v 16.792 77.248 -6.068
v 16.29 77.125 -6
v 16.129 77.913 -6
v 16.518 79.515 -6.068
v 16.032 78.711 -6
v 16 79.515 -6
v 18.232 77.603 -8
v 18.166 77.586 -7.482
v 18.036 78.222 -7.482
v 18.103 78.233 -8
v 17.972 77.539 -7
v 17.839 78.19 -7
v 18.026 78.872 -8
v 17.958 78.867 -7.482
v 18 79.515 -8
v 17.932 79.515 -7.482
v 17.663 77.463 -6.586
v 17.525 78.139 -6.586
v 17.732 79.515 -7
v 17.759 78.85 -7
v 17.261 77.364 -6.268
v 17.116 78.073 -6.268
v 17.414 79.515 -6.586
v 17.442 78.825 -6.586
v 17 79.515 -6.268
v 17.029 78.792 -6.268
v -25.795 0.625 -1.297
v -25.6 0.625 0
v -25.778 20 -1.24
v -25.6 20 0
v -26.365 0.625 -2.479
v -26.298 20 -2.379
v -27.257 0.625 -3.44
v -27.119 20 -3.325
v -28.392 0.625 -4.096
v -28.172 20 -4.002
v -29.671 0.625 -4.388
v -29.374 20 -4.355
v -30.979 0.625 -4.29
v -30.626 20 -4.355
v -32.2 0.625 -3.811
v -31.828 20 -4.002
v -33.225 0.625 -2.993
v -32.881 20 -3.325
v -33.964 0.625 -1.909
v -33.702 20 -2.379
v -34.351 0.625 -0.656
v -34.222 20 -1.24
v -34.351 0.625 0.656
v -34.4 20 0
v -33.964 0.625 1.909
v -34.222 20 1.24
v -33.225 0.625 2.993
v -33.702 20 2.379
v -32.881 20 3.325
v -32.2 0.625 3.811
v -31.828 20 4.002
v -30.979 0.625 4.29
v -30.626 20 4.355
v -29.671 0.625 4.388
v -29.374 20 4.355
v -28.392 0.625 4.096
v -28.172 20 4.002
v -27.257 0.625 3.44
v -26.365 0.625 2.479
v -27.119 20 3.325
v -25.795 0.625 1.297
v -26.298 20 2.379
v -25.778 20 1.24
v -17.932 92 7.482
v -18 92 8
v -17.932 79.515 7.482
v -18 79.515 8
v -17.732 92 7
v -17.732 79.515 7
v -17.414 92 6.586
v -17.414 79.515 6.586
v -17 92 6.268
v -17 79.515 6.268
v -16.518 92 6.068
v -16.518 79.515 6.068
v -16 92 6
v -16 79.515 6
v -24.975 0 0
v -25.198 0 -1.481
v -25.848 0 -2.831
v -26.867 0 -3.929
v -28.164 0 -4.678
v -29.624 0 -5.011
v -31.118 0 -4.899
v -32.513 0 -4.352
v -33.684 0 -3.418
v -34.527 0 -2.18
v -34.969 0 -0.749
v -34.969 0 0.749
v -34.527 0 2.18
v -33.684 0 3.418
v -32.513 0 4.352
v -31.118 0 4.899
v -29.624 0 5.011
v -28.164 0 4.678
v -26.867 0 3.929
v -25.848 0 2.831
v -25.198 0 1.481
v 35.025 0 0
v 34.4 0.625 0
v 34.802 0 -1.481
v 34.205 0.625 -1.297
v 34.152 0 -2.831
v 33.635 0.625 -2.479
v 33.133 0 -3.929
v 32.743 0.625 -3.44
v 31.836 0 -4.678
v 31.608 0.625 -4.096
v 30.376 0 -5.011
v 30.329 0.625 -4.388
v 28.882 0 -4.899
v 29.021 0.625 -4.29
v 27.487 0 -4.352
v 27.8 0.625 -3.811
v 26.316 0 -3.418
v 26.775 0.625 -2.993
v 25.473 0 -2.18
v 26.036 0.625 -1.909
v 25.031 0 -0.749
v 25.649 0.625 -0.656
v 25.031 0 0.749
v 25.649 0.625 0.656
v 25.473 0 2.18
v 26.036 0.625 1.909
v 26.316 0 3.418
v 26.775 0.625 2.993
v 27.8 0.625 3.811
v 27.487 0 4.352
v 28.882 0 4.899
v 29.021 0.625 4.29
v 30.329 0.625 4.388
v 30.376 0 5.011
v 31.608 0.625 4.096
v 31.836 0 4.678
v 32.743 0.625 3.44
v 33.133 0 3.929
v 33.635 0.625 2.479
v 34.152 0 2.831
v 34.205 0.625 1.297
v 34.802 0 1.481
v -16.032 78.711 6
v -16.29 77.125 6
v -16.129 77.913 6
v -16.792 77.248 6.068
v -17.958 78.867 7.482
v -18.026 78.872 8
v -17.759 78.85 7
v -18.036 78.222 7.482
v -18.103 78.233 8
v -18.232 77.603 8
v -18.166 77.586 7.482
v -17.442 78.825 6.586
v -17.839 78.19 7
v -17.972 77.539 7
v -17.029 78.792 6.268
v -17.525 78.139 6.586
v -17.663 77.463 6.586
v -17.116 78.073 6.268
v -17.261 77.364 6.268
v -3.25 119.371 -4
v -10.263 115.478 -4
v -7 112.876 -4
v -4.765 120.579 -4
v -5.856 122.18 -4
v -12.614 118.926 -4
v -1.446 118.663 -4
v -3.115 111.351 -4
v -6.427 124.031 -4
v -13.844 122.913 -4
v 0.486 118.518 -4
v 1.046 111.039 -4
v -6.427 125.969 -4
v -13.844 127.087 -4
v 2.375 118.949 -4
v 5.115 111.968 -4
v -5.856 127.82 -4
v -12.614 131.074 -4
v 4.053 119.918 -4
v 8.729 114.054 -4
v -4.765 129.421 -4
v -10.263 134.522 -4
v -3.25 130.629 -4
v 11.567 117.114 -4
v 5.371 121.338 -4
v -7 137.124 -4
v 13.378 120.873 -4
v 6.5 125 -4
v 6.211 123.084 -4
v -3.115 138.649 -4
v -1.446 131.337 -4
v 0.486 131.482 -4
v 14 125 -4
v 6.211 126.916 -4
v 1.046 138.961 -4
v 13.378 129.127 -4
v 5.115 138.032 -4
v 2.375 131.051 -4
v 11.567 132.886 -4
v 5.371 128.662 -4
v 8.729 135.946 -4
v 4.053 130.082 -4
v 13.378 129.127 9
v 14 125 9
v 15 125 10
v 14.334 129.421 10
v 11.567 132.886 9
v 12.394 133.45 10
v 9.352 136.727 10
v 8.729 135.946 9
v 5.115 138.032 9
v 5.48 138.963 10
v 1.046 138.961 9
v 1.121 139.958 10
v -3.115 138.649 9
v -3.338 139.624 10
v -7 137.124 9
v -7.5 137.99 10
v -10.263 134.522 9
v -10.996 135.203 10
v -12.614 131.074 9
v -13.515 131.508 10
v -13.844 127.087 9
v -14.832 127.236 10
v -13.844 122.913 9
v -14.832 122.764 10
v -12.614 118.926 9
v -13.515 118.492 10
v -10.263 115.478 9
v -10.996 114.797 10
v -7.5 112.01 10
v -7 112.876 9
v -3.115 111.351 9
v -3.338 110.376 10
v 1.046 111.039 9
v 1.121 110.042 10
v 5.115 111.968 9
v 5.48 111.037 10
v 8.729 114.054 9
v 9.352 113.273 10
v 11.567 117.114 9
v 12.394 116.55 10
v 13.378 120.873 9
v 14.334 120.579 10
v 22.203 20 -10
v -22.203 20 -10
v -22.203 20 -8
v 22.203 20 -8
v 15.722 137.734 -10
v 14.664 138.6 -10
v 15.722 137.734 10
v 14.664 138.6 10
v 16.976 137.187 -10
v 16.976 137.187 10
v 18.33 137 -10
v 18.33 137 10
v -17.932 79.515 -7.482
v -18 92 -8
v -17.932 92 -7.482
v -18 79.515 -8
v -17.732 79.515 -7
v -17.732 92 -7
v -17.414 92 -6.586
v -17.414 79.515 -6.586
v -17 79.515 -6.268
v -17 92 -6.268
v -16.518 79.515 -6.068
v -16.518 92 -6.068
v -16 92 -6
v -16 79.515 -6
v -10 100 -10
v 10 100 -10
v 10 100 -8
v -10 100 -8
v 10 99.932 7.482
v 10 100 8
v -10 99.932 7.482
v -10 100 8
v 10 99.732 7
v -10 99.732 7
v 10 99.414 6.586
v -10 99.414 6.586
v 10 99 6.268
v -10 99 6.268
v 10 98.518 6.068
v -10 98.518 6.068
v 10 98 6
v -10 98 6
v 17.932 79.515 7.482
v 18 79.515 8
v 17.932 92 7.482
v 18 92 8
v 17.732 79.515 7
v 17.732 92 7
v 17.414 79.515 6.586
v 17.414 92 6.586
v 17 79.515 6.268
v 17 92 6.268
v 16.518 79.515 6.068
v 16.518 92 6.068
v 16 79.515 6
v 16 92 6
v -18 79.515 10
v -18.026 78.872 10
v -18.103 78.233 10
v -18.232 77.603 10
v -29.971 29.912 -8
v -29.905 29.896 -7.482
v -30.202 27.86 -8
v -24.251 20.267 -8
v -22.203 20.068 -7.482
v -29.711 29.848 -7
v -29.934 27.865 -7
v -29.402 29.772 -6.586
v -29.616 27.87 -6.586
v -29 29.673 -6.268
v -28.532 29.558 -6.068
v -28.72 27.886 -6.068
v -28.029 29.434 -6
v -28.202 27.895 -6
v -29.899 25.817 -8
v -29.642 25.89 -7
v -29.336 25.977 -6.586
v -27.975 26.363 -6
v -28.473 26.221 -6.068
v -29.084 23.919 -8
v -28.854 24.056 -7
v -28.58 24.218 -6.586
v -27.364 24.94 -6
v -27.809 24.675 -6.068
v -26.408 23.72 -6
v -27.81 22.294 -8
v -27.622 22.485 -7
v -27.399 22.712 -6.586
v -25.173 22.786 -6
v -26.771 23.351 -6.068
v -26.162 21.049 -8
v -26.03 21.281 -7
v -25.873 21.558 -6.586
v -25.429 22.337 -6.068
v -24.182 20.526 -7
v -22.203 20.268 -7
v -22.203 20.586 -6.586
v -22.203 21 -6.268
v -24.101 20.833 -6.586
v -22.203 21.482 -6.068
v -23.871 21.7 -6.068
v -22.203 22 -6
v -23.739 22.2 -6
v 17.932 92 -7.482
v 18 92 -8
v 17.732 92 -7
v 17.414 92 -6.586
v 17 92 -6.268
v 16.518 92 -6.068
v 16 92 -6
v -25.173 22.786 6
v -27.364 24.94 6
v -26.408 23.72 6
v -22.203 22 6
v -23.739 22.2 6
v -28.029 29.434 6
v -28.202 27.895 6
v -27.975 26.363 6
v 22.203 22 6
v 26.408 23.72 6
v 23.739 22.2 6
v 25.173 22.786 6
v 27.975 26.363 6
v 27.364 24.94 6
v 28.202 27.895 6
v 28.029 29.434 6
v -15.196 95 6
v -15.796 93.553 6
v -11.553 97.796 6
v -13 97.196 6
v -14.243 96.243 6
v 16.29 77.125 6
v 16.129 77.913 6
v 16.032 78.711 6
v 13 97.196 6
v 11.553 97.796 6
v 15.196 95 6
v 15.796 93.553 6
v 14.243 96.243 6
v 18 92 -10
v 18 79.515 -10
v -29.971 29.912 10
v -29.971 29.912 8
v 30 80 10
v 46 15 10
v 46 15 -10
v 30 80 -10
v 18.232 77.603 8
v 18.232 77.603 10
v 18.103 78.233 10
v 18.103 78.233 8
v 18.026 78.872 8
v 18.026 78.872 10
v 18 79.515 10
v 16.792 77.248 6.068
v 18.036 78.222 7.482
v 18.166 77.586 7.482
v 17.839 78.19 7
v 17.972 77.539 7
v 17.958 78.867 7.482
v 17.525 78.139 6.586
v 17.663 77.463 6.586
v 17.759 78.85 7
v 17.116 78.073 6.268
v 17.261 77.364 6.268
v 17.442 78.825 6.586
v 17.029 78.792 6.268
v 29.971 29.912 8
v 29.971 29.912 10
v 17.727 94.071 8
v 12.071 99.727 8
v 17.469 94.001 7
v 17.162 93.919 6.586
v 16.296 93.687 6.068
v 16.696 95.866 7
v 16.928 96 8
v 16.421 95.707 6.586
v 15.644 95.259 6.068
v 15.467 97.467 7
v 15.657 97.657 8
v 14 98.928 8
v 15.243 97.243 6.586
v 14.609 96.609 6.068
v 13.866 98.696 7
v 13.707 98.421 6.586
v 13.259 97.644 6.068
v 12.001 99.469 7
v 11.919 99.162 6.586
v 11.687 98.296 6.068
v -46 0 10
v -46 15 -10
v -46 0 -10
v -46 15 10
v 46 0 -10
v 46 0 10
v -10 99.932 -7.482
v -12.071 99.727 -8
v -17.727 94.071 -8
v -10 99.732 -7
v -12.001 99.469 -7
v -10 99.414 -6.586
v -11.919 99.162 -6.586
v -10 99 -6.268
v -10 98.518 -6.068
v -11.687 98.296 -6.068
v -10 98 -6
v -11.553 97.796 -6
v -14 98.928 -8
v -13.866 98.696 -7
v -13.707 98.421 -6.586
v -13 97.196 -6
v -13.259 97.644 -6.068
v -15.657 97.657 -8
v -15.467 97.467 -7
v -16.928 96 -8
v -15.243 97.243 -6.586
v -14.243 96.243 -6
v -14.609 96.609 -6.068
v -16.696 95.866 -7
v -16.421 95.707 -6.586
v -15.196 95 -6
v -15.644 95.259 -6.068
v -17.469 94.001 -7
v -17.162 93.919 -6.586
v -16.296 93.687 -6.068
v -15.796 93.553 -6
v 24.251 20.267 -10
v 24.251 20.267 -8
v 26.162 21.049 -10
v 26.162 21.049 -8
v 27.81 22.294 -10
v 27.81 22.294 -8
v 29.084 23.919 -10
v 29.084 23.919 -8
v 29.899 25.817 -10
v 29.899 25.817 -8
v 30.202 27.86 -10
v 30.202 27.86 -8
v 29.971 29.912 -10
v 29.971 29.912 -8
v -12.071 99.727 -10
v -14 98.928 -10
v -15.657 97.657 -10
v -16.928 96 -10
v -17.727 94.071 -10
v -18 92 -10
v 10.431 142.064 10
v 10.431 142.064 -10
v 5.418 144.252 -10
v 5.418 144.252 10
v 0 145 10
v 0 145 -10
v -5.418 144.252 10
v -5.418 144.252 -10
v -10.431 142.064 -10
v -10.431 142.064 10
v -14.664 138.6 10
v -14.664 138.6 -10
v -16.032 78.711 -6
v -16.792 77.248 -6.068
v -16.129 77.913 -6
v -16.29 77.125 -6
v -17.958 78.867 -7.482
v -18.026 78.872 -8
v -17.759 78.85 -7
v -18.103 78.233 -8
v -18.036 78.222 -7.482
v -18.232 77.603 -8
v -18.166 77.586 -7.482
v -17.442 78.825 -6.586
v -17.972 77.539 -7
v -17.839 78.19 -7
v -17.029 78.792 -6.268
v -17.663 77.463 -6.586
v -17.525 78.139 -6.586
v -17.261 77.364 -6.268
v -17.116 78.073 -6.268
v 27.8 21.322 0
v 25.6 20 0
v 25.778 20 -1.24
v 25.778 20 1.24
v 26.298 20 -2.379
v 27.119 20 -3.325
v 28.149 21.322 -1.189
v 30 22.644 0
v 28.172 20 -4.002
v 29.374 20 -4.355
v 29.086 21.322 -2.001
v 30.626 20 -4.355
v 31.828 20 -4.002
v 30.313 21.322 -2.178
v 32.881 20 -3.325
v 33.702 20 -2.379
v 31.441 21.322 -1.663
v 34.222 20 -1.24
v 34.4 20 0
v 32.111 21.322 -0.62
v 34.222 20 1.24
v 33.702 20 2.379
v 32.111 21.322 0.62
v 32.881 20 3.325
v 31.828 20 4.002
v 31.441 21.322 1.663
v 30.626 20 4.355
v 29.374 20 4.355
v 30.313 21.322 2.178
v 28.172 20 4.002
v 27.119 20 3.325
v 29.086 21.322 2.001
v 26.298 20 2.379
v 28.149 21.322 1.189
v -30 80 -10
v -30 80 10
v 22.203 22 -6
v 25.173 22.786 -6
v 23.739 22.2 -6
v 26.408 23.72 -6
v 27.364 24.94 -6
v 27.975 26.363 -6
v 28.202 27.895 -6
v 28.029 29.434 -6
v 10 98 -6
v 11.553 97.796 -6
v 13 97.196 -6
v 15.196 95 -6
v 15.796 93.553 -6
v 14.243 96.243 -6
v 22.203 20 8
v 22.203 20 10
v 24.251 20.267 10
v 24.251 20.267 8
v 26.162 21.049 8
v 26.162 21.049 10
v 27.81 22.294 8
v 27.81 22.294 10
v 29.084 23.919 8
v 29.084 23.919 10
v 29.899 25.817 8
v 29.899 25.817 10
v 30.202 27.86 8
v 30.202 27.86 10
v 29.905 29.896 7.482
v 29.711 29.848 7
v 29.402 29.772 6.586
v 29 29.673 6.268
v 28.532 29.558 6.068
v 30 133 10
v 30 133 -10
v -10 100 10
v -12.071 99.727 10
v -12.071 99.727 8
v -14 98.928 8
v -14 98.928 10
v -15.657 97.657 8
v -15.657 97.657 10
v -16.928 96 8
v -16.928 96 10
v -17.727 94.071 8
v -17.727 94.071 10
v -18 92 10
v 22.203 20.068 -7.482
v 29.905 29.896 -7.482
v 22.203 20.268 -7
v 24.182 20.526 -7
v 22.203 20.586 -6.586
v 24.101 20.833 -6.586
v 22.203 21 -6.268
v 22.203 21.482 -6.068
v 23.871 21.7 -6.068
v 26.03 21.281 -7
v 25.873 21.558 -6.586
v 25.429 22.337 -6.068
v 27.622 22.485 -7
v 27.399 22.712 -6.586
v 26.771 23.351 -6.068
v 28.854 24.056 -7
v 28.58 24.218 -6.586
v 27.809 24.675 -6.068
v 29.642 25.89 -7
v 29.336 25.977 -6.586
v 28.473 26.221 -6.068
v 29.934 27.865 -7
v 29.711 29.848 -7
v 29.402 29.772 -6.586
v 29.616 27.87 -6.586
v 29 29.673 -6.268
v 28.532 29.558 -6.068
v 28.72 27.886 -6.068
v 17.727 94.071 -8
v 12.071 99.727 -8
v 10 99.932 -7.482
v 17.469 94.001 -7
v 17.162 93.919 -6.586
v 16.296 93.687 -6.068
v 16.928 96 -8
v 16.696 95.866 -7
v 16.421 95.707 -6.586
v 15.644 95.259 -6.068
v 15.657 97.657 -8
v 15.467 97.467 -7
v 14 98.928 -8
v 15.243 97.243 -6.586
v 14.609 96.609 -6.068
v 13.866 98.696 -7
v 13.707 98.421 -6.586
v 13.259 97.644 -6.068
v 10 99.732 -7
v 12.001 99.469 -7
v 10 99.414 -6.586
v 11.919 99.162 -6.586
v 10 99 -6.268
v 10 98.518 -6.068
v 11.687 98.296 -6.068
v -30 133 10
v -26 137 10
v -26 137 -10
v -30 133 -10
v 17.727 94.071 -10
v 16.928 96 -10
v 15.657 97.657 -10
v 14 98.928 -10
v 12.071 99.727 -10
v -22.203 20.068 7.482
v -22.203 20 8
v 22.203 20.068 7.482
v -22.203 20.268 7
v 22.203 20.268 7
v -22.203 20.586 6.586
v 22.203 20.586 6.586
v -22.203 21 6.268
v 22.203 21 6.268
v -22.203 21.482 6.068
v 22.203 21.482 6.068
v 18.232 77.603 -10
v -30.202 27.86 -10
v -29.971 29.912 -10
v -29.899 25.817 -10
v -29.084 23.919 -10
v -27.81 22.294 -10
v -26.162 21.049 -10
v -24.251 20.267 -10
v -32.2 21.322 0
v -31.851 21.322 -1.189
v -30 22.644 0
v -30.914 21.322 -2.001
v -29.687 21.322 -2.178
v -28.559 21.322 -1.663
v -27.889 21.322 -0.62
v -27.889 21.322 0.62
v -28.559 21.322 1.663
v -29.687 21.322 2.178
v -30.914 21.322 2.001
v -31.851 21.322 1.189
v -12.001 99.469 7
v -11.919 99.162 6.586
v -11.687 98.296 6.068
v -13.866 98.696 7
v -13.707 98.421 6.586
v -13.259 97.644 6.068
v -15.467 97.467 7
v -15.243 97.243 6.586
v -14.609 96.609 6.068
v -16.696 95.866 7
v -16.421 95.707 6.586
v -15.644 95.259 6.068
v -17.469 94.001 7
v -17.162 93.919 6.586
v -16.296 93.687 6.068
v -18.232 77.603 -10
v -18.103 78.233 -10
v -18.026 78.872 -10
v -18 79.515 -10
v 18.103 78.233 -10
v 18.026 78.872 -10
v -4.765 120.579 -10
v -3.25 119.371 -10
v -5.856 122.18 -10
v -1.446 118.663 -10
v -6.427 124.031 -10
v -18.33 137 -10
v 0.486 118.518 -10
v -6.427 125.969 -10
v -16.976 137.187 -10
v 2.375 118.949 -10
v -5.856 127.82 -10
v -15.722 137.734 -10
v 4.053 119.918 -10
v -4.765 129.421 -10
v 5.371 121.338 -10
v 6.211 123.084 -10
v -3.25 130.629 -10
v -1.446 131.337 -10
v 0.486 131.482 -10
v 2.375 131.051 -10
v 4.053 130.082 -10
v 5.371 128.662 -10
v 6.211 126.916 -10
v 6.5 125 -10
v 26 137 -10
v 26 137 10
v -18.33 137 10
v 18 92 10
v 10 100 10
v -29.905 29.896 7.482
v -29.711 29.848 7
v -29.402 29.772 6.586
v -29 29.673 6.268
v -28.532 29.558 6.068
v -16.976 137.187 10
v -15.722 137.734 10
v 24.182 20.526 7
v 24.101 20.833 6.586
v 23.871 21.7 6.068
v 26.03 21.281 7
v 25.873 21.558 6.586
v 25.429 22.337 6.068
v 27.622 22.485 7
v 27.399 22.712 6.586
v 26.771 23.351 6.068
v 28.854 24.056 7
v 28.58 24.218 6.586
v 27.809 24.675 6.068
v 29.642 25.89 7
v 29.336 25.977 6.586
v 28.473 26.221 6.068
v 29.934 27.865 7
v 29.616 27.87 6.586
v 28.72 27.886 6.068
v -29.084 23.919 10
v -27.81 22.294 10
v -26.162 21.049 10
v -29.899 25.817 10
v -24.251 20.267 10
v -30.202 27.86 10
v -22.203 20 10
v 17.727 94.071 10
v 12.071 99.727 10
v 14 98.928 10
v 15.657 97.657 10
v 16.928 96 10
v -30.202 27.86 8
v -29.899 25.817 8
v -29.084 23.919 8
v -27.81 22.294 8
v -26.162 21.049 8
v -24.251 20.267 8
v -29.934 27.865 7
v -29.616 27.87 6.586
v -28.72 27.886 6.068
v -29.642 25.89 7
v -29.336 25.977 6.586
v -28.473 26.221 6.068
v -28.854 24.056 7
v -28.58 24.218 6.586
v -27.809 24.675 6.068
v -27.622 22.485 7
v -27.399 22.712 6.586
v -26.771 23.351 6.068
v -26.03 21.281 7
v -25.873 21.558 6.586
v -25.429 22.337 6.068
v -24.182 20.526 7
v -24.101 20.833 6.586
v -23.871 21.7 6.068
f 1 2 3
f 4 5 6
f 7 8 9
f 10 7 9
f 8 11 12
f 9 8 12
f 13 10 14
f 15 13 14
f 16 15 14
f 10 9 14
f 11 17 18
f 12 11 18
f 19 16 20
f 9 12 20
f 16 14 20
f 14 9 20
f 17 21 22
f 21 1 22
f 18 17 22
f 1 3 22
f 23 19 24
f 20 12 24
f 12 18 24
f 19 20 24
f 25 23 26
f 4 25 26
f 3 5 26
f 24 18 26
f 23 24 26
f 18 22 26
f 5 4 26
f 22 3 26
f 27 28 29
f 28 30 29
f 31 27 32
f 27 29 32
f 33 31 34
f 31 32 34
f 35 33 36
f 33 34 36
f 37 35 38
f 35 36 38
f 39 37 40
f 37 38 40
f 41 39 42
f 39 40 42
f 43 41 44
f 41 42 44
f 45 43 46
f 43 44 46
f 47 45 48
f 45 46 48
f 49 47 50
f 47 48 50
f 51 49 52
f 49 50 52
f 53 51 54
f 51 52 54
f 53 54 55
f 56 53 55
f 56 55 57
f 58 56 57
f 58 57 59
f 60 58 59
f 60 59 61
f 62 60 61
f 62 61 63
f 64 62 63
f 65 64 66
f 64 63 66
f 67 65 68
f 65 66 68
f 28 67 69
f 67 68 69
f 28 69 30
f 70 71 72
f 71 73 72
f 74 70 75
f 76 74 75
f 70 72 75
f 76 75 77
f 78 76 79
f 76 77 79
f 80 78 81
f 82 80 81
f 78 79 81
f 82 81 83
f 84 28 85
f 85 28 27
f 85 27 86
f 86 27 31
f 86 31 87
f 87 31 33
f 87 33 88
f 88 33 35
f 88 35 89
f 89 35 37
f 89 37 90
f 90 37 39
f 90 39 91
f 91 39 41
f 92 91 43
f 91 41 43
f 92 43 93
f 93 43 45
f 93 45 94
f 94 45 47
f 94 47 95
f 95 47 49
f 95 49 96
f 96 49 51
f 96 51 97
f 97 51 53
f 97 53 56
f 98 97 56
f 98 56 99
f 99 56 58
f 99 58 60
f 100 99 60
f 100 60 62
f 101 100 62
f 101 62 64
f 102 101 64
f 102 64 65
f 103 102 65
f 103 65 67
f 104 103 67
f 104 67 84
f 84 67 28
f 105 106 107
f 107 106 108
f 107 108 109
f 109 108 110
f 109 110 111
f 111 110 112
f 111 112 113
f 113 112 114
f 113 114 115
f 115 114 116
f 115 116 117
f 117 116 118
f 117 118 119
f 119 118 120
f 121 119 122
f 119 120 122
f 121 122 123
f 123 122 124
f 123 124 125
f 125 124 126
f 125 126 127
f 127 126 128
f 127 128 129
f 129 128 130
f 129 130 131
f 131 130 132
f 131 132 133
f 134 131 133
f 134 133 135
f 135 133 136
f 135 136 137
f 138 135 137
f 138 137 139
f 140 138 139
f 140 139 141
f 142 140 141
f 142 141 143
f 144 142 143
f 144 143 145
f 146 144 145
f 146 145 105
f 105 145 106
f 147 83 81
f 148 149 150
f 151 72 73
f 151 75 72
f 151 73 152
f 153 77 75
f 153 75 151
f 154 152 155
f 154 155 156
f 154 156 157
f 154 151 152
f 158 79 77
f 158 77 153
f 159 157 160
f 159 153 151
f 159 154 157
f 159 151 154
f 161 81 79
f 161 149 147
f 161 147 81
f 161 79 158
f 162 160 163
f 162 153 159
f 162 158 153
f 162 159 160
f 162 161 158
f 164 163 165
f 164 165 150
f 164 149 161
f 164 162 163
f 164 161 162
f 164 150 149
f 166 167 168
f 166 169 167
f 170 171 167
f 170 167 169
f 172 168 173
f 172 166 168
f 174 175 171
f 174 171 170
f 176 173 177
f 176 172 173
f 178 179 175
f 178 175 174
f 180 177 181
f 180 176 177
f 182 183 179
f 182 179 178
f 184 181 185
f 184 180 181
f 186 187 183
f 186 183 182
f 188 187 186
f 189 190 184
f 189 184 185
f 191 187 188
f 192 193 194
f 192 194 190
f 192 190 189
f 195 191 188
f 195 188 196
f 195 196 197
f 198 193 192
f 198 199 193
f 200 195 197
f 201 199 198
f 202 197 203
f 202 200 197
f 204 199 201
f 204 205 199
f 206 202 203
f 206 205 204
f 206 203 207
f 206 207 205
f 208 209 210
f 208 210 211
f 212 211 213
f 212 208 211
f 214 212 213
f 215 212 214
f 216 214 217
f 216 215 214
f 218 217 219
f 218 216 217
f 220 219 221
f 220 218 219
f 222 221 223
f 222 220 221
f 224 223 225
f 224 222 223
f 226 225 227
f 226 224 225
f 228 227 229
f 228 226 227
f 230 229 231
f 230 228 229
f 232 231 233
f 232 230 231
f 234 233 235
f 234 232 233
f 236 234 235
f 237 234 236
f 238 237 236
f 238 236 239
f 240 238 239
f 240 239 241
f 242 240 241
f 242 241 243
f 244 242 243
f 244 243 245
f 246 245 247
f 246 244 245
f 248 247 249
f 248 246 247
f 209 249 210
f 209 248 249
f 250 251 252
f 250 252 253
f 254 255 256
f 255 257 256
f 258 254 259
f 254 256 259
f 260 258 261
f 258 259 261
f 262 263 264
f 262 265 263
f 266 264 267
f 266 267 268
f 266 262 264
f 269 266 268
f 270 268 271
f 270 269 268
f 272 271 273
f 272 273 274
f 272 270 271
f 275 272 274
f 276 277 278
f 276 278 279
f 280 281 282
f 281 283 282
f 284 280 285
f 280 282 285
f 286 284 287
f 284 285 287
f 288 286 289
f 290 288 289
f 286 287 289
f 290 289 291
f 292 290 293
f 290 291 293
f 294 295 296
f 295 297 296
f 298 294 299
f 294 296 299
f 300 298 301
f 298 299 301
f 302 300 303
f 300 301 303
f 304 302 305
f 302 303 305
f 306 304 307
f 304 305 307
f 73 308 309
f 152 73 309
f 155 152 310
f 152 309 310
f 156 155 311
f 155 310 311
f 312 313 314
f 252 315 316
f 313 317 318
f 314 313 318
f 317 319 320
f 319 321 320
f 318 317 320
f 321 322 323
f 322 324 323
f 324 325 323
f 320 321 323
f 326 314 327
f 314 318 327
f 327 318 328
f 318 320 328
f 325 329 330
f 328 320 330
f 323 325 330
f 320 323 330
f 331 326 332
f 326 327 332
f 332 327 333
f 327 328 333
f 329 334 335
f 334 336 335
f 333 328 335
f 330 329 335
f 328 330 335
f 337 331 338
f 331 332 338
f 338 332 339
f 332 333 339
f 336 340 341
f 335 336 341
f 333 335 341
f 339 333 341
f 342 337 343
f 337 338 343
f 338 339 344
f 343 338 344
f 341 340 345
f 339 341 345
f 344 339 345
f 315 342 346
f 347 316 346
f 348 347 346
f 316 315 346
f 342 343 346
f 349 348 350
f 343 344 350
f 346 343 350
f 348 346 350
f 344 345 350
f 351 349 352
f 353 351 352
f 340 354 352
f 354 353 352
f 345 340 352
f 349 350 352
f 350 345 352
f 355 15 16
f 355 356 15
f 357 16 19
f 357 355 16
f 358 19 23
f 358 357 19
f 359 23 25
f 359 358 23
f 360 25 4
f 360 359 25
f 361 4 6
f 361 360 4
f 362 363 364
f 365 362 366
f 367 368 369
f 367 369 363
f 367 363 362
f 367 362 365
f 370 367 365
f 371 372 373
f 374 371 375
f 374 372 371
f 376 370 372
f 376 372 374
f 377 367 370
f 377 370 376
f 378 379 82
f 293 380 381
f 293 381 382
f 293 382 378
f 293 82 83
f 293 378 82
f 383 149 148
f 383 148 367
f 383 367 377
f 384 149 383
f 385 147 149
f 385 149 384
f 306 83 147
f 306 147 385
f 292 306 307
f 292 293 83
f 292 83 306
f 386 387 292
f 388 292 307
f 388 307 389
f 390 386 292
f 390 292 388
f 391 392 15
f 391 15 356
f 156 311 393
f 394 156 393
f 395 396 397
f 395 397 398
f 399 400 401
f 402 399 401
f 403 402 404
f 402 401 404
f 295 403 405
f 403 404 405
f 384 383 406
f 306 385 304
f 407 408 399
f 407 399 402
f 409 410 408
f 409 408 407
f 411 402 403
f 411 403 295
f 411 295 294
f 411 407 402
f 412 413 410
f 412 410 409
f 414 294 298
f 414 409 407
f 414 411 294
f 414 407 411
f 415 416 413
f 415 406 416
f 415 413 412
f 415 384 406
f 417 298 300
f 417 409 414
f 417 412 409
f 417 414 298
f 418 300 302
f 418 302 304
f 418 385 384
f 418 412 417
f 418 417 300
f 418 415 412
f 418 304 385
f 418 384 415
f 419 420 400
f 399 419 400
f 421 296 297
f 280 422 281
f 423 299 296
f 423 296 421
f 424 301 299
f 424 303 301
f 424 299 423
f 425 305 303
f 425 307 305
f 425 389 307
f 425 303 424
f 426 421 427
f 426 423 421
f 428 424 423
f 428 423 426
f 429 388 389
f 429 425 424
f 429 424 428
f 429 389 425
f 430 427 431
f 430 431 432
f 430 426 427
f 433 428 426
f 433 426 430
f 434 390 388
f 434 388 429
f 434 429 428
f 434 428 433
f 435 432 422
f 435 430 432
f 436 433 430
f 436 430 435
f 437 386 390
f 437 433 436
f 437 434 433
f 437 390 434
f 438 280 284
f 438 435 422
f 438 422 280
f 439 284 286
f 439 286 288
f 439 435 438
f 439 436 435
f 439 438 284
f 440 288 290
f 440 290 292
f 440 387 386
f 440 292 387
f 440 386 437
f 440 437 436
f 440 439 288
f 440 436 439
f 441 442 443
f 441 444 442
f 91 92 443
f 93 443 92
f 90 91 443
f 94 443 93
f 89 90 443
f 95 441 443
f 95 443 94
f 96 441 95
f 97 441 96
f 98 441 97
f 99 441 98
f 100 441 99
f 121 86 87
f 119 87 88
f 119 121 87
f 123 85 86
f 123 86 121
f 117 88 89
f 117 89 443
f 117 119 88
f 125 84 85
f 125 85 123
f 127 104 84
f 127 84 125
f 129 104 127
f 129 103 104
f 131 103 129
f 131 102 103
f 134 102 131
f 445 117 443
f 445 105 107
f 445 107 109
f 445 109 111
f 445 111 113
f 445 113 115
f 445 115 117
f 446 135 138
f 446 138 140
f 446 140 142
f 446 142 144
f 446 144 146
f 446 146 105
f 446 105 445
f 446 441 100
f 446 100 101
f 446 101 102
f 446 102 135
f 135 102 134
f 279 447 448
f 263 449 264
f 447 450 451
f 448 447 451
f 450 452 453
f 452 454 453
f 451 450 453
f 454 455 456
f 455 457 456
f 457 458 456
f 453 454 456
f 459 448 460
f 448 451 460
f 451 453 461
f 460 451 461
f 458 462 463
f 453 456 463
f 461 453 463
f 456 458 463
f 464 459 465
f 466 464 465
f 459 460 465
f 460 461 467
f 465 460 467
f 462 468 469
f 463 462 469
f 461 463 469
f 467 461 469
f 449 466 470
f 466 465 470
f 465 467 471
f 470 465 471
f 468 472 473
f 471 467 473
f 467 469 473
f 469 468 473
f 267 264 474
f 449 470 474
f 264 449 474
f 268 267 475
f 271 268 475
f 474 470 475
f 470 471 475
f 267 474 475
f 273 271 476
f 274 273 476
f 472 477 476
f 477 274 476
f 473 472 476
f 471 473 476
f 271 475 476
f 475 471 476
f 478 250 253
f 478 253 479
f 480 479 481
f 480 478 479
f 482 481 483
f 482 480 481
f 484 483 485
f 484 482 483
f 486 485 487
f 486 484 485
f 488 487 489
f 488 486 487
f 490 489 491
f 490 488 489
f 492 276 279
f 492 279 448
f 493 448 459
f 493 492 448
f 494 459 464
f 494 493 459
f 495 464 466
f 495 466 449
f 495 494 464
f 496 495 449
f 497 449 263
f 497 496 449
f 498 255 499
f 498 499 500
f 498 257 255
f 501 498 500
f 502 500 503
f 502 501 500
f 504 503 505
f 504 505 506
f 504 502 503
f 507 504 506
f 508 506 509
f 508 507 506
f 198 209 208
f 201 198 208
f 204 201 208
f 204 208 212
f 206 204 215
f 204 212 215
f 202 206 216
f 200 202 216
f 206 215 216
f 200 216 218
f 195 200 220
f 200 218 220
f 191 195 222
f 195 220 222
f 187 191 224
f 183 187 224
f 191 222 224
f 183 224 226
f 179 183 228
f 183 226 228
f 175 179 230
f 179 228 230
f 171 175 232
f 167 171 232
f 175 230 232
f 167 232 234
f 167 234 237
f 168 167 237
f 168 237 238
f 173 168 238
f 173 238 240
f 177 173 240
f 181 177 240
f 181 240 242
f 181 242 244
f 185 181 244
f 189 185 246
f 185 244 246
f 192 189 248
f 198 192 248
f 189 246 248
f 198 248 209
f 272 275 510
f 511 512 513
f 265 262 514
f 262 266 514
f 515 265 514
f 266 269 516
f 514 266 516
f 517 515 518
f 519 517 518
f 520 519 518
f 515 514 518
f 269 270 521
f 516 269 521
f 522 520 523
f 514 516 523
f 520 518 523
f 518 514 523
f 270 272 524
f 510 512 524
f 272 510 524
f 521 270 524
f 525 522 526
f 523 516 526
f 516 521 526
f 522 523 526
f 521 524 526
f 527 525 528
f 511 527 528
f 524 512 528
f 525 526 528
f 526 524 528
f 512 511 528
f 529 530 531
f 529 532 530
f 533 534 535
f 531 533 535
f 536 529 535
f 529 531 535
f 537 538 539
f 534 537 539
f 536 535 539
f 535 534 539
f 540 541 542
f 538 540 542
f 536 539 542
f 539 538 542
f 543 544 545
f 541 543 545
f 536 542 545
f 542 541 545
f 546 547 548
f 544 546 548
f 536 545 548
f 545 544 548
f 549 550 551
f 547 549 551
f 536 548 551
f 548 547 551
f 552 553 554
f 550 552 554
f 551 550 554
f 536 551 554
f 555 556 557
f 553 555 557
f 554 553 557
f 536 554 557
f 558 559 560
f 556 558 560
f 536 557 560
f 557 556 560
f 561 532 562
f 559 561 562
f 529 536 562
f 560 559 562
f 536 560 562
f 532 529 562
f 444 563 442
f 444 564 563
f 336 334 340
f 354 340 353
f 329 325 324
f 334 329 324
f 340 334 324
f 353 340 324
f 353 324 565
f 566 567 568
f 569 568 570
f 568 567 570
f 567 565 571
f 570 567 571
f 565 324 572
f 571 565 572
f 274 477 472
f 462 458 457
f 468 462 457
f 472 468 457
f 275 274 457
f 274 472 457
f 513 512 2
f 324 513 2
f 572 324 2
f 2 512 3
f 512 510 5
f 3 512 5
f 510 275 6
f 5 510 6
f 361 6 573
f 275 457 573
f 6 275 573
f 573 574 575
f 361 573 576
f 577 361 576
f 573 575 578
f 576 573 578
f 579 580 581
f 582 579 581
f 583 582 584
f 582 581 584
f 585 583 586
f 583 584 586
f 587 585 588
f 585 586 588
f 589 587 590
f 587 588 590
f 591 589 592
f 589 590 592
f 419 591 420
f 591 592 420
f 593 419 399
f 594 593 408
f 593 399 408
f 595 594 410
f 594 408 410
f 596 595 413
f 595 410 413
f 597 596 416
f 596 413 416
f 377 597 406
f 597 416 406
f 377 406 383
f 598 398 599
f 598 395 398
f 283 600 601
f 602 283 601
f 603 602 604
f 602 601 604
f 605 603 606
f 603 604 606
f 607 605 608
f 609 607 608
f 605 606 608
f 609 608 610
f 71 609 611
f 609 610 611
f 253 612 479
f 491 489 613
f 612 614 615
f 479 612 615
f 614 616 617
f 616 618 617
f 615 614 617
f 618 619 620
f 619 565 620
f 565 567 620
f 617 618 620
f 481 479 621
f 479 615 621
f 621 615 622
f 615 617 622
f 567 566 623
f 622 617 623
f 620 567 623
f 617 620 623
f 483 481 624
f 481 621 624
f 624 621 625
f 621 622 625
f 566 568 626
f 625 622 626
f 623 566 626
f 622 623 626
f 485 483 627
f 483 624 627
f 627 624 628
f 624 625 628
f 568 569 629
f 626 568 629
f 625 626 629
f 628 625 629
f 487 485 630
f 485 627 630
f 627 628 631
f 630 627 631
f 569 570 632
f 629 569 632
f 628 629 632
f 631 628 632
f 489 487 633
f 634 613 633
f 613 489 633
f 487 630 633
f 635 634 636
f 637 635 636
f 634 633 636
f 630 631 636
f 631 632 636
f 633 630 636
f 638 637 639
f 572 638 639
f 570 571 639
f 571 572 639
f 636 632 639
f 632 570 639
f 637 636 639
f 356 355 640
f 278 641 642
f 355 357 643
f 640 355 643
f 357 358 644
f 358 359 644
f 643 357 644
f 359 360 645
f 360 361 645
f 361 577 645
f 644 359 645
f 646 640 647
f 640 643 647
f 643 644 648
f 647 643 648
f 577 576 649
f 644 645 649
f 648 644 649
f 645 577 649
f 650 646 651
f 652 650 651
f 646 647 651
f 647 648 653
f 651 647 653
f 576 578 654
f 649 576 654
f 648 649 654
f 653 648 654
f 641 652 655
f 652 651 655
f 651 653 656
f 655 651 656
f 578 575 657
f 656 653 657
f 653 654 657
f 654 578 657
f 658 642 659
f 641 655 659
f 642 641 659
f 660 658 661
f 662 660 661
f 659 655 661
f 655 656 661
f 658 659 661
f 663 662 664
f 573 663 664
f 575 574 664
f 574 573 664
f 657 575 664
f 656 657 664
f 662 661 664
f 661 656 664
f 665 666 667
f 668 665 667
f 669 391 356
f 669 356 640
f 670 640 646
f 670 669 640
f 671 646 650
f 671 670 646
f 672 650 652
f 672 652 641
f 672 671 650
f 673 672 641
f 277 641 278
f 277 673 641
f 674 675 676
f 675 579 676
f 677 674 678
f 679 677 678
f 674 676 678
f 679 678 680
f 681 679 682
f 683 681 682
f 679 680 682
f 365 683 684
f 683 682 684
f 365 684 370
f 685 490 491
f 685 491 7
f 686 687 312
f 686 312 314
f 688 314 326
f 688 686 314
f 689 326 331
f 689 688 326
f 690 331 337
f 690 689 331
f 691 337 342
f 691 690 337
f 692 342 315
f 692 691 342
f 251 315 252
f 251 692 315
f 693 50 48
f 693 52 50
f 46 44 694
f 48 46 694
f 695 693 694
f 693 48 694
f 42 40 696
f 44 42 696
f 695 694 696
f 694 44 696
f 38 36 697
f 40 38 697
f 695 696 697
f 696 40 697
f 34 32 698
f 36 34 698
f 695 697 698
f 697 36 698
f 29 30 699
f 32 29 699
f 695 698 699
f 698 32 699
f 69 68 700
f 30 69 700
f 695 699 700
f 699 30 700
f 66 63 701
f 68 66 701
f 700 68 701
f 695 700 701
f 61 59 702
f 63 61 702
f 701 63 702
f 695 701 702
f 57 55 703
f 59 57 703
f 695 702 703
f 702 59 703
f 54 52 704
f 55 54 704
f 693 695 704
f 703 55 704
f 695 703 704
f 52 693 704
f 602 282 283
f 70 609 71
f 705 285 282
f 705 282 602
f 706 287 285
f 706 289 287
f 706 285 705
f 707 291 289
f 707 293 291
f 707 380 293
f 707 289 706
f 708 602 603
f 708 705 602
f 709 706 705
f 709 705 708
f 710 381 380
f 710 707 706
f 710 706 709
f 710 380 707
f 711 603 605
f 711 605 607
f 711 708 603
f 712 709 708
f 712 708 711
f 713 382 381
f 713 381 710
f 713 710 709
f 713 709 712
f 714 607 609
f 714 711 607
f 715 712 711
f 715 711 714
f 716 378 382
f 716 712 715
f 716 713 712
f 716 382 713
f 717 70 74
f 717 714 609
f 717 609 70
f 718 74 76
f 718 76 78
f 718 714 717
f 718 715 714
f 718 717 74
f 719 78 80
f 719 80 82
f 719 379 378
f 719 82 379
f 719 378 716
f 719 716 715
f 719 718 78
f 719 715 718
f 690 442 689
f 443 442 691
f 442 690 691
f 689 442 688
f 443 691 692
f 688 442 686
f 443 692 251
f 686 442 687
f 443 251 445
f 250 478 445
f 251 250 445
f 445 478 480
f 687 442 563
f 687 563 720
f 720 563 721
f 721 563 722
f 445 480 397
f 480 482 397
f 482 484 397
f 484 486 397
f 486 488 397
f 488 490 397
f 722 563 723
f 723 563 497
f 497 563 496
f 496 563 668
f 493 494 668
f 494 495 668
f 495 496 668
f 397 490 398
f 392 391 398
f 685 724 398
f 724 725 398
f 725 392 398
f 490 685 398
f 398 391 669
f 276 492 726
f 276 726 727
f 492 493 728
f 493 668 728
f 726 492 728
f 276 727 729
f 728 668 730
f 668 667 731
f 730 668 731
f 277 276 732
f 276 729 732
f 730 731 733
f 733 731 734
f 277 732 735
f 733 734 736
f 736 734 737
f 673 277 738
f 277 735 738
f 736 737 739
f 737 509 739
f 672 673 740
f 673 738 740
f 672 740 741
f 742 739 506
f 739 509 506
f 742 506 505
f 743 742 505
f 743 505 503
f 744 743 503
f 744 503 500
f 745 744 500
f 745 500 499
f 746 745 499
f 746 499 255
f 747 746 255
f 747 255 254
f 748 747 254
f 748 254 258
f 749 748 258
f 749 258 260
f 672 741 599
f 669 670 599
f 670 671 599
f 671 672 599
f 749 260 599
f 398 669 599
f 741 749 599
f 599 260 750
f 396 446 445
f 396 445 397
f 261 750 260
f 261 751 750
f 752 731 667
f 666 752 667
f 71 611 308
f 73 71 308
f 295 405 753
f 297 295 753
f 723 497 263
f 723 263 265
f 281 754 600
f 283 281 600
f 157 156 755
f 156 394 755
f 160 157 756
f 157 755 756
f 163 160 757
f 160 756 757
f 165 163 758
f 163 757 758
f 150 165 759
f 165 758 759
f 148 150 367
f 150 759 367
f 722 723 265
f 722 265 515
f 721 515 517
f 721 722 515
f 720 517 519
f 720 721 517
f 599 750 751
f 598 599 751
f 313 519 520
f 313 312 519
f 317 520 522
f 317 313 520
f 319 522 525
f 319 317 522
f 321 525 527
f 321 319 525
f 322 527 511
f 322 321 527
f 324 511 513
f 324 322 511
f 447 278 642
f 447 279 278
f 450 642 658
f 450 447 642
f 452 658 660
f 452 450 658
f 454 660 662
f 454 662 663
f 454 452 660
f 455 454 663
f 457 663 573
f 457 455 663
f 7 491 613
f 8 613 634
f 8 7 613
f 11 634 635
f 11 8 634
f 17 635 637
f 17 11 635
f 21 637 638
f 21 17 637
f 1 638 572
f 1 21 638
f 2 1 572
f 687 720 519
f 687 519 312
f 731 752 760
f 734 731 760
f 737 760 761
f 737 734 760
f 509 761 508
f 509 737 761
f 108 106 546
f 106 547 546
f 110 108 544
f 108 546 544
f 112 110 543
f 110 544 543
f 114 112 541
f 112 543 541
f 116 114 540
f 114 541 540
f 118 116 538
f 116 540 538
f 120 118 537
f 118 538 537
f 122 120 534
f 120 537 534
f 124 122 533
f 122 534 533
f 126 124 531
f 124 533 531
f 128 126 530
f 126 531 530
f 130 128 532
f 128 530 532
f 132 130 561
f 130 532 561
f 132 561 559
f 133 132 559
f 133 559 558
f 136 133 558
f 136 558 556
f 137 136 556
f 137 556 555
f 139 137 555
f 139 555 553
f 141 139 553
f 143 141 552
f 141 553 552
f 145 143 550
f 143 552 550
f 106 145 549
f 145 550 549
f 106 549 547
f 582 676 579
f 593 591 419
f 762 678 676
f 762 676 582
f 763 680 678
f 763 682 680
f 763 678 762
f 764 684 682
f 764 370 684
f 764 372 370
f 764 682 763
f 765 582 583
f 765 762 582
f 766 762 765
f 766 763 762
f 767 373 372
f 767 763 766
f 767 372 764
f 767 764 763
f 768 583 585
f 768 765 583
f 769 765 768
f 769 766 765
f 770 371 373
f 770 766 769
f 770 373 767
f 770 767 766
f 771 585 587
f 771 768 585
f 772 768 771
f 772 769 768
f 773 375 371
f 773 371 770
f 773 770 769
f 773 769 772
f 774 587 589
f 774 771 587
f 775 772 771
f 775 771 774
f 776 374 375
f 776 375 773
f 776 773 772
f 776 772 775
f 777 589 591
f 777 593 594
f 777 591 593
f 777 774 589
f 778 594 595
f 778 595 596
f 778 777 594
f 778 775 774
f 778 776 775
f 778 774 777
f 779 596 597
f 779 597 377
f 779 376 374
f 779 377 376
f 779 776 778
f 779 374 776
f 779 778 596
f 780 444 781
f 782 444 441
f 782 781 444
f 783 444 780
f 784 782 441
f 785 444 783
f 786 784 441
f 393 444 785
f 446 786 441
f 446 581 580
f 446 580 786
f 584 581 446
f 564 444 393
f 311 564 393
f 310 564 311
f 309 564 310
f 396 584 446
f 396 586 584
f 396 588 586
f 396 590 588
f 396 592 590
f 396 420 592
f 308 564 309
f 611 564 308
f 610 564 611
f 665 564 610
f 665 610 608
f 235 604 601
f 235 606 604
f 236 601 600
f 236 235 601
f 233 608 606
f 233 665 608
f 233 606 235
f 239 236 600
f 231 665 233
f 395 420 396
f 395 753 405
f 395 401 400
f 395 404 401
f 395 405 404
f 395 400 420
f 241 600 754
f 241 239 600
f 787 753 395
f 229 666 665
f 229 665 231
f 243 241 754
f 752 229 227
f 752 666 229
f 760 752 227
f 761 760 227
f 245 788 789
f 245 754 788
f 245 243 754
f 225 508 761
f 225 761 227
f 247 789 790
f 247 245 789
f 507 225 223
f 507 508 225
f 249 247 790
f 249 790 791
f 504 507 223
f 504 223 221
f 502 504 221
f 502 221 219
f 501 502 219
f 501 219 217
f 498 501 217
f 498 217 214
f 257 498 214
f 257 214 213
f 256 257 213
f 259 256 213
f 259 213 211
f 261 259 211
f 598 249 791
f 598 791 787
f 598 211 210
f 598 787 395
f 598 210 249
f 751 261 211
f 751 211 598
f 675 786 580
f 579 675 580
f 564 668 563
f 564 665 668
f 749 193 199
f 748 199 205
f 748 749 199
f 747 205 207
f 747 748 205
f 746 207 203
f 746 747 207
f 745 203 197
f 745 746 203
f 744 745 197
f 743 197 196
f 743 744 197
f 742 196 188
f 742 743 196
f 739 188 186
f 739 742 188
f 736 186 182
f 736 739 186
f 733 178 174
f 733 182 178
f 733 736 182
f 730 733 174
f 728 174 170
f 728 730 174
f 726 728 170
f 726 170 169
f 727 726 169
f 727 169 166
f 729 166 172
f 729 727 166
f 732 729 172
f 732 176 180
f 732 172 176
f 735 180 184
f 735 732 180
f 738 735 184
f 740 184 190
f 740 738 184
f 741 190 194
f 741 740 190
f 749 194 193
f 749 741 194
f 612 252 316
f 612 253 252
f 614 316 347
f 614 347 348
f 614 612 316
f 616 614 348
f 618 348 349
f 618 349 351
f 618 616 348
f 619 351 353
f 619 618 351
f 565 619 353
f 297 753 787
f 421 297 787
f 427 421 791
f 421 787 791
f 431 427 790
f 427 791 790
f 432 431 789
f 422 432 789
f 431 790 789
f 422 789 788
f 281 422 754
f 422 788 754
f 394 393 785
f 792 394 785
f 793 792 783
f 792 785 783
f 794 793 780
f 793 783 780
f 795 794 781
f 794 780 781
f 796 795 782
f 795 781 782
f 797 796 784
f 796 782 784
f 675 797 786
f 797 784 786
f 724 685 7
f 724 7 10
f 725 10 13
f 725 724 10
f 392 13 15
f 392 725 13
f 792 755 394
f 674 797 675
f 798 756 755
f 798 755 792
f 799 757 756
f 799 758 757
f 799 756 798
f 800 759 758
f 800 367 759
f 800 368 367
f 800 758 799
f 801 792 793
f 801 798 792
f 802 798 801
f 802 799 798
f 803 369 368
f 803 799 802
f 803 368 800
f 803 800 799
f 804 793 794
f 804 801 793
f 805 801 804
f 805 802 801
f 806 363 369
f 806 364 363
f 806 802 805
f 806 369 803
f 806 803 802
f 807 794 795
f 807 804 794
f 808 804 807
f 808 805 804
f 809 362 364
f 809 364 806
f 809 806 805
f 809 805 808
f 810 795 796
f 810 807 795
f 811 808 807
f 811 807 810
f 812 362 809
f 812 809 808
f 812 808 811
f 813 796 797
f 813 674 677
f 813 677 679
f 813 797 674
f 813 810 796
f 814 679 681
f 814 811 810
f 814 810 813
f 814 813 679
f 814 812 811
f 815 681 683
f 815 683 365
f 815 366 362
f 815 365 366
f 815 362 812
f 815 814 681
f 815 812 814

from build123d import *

# Parameters (mm, degrees)
SKETCH1_R                         = 6.5
BOSS_EXTRUDE1_DEPTH               = 10
SKETCH2_R                         = 14
CUT_EXTRUDE1_DEPTH                = 14
CHAMFER1_SIZE                     = 1
CHAMFER2_SIZE                     = 4
FILLET1_R                         = 5
CUT_EXTRUDE2_DEPTH                = 4
FILLET2_R                         = 2
FILLET2_OF_MIRROR1_R              = 2
M10X1_25_TAPPED_HOLE2_D           = 8.8
M10X1_25_TAPPED_HOLE2_DEPTH       = 20
M10X1_25_TAPPED_HOLE2_CSINK_D     = 10.05
M10X1_25_TAPPED_HOLE2_CSINK_ANGLE = 90
M10X1_25_TAPPED_HOLE2_TIP         = 2.643786724


with BuildPart() as part:
    # Sketch1 → Boss-Extrude1 (new, symmetric)
    with BuildSketch(Plane.XY):
        with BuildLine():
            Line((-46, 0), (46, 0))
            Line((46, 0), (46, 15))
            Line((46, 15), (30, 80))
            Line((30, 80), (30, 137))
            Line((30, 137), (16, 137))
            ThreePointArc((16, 137), (0, 145), (-16, 137))
            Line((-16, 137), (-30, 137))
            Line((-30, 137), (-30, 80))
            Line((-30, 80), (-46, 15))
            Line((-46, 15), (-46, 0))
        make_face()
        with Locations((0, 125)):
            Circle(SKETCH1_R, mode=Mode.SUBTRACT)
    extrude(amount=BOSS_EXTRUDE1_DEPTH, both=True)

    # Sketch2 → Cut-Extrude1 (cut)
    with BuildSketch(Plane.XY.offset(10)):
        with Locations((0, 125)):
            Circle(SKETCH2_R)
    extrude(amount=-CUT_EXTRUDE1_DEPTH, mode=Mode.SUBTRACT)

    # Chamfer1
    chamfer1_edges = [part.edges().sort_by_distance(p)[0] for p in [
        (-14, 125, 10),
    ]]
    chamfer(chamfer1_edges, length=CHAMFER1_SIZE)

    # Chamfer2
    chamfer2_edges = [part.edges().sort_by_distance(p)[0] for p in [
        (-30, 137, 0),
        (30, 137, 0),
    ]]
    chamfer(chamfer2_edges, length=CHAMFER2_SIZE)

    # Fillet1
    fillet1_edges = [part.edges().sort_by_distance(p)[0] for p in [
        (-16, 137, 0),
        (16, 137, 0),
    ]]
    fillet(fillet1_edges, radius=FILLET1_R)

    # Sketch3 → Cut-Extrude2 (cut)
    with BuildSketch(Plane.XY.offset(10)):
        with BuildLine():
            Line((-18, 92), (-18, 79.514932029))
            ThreePointArc((-18, 79.514932029), (-18.058181812, 78.55185162), (-18.231880969, 77.602779652))
            Line((-18.231880969, 77.602779652), (-29.971112298, 29.912152377))
            ThreePointArc((-29.971112298, 29.912152377), (-28.49970745, 23.065287193), (-22.202993266, 20))
            Line((-22.202993266, 20), (22.202993266, 20))
            ThreePointArc((22.202993266, 20), (28.49970745, 23.065287193), (29.971112298, 29.912152377))
            Line((29.971112298, 29.912152377), (18.231880969, 77.602779652))
            ThreePointArc((18.231880969, 77.602779652), (18.058181812, 78.55185162), (18, 79.514932029))
            Line((18, 79.514932029), (18, 92))
            ThreePointArc((18, 92), (15.656854249, 97.656854249), (10, 100))
            Line((10, 100), (-10, 100))
            ThreePointArc((-10, 100), (-15.656854249, 97.656854249), (-18, 92))
        make_face()
    cut_extrude2 = extrude(amount=-CUT_EXTRUDE2_DEPTH, mode=Mode.SUBTRACT)

    # Fillet2
    fillet2_edges = [part.edges().sort_by_distance(p)[0] for p in [
        (18.058181812, 78.55185162, 6),
        (24.101496633, 53.757466014, 6),
        (28.49970745, 23.065287193, 6),
        (0, 20, 6),
        (-28.49970745, 23.065287193, 6),
        (-24.101496633, 53.757466014, 6),
        (-18.058181812, 78.55185162, 6),
        (-18, 85.757466014, 6),
        (-15.656854249, 97.656854249, 6),
        (0, 100, 6),
        (15.656854249, 97.656854249, 6),
        (18, 85.757466014, 6),
    ]]
    fillet(fillet2_edges, radius=FILLET2_R)

    # Mirror1: Cut-Extrude2 across plane
    add(cut_extrude2.mirror(Plane.XY), mode=Mode.SUBTRACT)

    # Fillet2 of Mirror1
    fillet2_of_mirror1_edges = [part.edges().sort_by_distance(p)[0] for p in [
        (18.058181812, 78.55185162, -6),
        (24.101496633, 53.757466014, -6),
        (28.49970745, 23.065287193, -6),
        (0, 20, -6),
        (-28.49970745, 23.065287193, -6),
        (-24.101496633, 53.757466014, -6),
        (-18.058181812, 78.55185162, -6),
        (-18, 85.757466014, -6),
        (-15.656854249, 97.656854249, -6),
        (0, 100, -6),
        (15.656854249, 97.656854249, -6),
        (18, 85.757466014, -6),
    ]]
    fillet(fillet2_of_mirror1_edges, radius=FILLET2_OF_MIRROR1_R)

    # M10x1.25 Tapped Hole2
    with Locations(Plane(origin=(0, 0, 0), x_dir=(-1, 0, 0), z_dir=(0, -1, 0))):
        with Locations((-30, 0), (30, 0)):
            CounterSinkHole(M10X1_25_TAPPED_HOLE2_D / 2, M10X1_25_TAPPED_HOLE2_CSINK_D / 2, depth=M10X1_25_TAPPED_HOLE2_DEPTH, counter_sink_angle=M10X1_25_TAPPED_HOLE2_CSINK_ANGLE)
            with Locations((0, 0, -(M10X1_25_TAPPED_HOLE2_DEPTH + M10X1_25_TAPPED_HOLE2_TIP / 2))):  # 118° drill point
                Cone(0, M10X1_25_TAPPED_HOLE2_D / 2, M10X1_25_TAPPED_HOLE2_TIP, mode=Mode.SUBTRACT)


solid = part.part
